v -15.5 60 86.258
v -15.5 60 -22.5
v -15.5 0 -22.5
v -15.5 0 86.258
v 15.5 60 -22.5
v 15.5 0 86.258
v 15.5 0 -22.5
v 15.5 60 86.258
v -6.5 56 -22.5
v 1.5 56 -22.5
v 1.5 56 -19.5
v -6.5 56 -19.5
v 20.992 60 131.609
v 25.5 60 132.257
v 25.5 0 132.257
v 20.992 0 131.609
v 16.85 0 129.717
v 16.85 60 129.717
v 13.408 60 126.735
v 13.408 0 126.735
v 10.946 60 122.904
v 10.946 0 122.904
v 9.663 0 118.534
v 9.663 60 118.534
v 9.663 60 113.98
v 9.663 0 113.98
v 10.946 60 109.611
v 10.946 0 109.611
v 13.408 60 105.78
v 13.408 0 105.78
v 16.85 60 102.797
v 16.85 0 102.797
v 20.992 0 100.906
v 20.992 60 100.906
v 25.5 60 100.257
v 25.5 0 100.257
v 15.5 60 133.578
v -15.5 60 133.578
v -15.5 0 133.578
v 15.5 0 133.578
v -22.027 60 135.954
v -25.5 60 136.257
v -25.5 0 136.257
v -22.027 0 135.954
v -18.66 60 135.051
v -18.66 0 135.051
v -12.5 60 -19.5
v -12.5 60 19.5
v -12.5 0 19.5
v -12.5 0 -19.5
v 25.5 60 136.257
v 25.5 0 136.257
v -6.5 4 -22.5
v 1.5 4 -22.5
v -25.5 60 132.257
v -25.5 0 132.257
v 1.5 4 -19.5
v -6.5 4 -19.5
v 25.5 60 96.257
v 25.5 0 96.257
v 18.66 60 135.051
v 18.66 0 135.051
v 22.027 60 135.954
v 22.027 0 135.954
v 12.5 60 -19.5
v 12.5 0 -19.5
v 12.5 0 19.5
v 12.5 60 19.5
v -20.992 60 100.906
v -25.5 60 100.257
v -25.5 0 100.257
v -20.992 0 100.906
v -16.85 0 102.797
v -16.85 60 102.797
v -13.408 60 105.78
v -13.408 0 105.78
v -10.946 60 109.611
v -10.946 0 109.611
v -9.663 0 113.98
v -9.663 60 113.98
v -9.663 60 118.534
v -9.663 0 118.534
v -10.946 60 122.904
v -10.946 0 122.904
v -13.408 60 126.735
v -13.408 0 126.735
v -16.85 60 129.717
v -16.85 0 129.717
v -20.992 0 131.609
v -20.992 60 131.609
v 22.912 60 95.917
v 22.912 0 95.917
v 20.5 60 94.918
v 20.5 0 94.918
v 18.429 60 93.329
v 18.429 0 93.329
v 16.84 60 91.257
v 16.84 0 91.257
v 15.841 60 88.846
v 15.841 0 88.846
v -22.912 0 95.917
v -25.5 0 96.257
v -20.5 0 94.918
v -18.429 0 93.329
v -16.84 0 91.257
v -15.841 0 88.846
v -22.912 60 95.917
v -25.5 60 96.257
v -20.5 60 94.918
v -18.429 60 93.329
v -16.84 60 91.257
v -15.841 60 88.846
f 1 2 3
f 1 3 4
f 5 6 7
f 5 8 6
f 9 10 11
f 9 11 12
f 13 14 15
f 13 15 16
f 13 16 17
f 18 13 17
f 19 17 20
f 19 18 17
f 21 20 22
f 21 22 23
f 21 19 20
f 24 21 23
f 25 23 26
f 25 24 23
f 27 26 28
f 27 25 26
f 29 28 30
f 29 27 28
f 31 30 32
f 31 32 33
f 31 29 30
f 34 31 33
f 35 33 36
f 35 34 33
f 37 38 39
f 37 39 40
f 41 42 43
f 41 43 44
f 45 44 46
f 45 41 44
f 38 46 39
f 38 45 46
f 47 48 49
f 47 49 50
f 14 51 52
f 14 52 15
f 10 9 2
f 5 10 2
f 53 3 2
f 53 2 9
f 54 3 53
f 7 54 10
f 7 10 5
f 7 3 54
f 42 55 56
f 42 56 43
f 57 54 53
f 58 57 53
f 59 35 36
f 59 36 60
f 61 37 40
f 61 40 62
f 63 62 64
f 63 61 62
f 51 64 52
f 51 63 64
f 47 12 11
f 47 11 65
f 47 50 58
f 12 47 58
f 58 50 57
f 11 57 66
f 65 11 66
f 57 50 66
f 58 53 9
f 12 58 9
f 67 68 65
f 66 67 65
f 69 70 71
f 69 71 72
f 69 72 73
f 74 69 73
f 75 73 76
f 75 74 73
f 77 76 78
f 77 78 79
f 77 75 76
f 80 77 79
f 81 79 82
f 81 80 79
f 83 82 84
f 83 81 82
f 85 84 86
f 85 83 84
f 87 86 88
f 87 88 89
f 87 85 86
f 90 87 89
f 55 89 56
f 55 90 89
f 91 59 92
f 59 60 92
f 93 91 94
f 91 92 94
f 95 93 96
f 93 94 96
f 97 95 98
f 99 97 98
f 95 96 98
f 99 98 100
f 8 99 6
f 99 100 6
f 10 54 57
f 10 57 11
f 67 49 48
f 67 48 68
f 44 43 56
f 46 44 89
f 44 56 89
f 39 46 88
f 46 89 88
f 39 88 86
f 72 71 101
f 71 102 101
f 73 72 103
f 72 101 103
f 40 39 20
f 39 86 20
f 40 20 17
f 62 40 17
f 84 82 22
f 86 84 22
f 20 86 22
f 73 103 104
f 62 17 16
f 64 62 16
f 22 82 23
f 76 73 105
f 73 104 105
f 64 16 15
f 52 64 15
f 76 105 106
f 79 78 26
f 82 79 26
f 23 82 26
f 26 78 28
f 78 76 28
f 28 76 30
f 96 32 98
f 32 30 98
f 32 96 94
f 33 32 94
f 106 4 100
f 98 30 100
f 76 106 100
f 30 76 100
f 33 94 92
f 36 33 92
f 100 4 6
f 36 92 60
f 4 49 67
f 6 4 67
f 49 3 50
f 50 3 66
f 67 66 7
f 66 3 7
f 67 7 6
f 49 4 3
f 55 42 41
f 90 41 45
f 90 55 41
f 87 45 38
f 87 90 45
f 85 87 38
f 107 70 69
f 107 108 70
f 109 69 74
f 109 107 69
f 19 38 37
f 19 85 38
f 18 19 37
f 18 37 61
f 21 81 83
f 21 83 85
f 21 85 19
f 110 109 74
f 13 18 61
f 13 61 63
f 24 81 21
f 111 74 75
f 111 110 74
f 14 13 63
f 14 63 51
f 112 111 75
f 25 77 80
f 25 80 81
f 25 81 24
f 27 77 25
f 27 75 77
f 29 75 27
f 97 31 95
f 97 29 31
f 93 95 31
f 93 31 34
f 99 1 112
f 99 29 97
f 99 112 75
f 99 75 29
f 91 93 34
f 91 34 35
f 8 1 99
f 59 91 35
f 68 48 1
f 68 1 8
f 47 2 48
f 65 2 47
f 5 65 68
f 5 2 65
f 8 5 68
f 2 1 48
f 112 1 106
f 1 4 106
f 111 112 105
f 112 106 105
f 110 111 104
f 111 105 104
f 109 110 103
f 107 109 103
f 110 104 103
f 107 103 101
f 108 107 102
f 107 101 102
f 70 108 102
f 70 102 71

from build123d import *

# Parameters (mm, degrees)
SKETCH1_W           = 31
SKETCH1_H           = 45
SKETCH1_W_2         = 25
SKETCH1_H_2         = 39
BOSS_EXTRUDE1_DEPTH = 60
BOSS_EXTRUDE3_DEPTH = 60
SKETCH3_W           = 8
SKETCH3_H           = 52
CUT_EXTRUDE1_DEPTH  = 9
FILLET1_R           = 10


with BuildPart() as part:
    # Sketch1 → Boss-Extrude1 (new body)
    with BuildSketch(Plane(origin=(0, 0, 0), x_dir=(1, 0, 0), z_dir=(0, 1, 0))):
        Rectangle(SKETCH1_W, SKETCH1_H)
        Rectangle(SKETCH1_W_2, SKETCH1_H_2, mode=Mode.SUBTRACT)
    extrude(amount=BOSS_EXTRUDE1_DEPTH)

    # Sketch5 → Boss-Extrude3 (add)
    with BuildSketch(Plane(origin=(0, 60, 0), x_dir=(1, 0, 0), z_dir=(0, 1, 0))):
        with BuildLine():
            ThreePointArc((-25.5, -136.257439501), (-20.323619098, -135.575956026), (-15.5, -133.577947576))
            Line((-15.5, -133.577947576), (15.5, -133.577947576))
            ThreePointArc((15.5, -133.577947576), (20.323619098, -135.575956026), (25.5, -136.257439501))
            Line((25.5, -136.257439501), (25.5, -132.257439501))
            ThreePointArc((25.5, -132.257439501), (9.5, -116.257439501), (25.5, -100.257439501))
            Line((25.5, -100.257439501), (25.5, -96.257439501))
            ThreePointArc((25.5, -96.257439501), (20.323619098, -96.938922975), (15.5, -98.936931425))
            Line((15.5, -98.936931425), (15.5, -22.5))
            Line((15.5, -22.5), (-15.5, -22.5))
            Line((-15.5, -22.5), (-15.5, -98.936931425))
            ThreePointArc((-15.5, -98.936931425), (-20.323619098, -96.938922975), (-25.5, -96.257439501))
            Line((-25.5, -96.257439501), (-25.5, -100.257439501))
            ThreePointArc((-25.5, -100.257439501), (-9.5, -116.257439501), (-25.5, -132.257439501))
            Line((-25.5, -132.257439501), (-25.5, -136.257439501))
        make_face()
    extrude(amount=-BOSS_EXTRUDE3_DEPTH)

    # Sketch3 → Cut-Extrude1 (cut)
    with BuildSketch(Plane(origin=(0, 0, -22.5), x_dir=(-1, 0, 0), z_dir=(0, 0, -1))):
        with Locations((2.5, 30)):
            Rectangle(SKETCH3_W, SKETCH3_H)
    extrude(amount=-CUT_EXTRUDE1_DEPTH, mode=Mode.SUBTRACT)

    # Fillet1
    fillet1_edges = [part.edges().sort_by_distance(p)[0] for p in [
        (-15.5, 30, 98.936931425),
        (15.5, 30, 98.936931425),
    ]]
    fillet(fillet1_edges, radius=FILLET1_R - 0.0001)  # a hair under: the kernel refuses the full size


solid = part.part
